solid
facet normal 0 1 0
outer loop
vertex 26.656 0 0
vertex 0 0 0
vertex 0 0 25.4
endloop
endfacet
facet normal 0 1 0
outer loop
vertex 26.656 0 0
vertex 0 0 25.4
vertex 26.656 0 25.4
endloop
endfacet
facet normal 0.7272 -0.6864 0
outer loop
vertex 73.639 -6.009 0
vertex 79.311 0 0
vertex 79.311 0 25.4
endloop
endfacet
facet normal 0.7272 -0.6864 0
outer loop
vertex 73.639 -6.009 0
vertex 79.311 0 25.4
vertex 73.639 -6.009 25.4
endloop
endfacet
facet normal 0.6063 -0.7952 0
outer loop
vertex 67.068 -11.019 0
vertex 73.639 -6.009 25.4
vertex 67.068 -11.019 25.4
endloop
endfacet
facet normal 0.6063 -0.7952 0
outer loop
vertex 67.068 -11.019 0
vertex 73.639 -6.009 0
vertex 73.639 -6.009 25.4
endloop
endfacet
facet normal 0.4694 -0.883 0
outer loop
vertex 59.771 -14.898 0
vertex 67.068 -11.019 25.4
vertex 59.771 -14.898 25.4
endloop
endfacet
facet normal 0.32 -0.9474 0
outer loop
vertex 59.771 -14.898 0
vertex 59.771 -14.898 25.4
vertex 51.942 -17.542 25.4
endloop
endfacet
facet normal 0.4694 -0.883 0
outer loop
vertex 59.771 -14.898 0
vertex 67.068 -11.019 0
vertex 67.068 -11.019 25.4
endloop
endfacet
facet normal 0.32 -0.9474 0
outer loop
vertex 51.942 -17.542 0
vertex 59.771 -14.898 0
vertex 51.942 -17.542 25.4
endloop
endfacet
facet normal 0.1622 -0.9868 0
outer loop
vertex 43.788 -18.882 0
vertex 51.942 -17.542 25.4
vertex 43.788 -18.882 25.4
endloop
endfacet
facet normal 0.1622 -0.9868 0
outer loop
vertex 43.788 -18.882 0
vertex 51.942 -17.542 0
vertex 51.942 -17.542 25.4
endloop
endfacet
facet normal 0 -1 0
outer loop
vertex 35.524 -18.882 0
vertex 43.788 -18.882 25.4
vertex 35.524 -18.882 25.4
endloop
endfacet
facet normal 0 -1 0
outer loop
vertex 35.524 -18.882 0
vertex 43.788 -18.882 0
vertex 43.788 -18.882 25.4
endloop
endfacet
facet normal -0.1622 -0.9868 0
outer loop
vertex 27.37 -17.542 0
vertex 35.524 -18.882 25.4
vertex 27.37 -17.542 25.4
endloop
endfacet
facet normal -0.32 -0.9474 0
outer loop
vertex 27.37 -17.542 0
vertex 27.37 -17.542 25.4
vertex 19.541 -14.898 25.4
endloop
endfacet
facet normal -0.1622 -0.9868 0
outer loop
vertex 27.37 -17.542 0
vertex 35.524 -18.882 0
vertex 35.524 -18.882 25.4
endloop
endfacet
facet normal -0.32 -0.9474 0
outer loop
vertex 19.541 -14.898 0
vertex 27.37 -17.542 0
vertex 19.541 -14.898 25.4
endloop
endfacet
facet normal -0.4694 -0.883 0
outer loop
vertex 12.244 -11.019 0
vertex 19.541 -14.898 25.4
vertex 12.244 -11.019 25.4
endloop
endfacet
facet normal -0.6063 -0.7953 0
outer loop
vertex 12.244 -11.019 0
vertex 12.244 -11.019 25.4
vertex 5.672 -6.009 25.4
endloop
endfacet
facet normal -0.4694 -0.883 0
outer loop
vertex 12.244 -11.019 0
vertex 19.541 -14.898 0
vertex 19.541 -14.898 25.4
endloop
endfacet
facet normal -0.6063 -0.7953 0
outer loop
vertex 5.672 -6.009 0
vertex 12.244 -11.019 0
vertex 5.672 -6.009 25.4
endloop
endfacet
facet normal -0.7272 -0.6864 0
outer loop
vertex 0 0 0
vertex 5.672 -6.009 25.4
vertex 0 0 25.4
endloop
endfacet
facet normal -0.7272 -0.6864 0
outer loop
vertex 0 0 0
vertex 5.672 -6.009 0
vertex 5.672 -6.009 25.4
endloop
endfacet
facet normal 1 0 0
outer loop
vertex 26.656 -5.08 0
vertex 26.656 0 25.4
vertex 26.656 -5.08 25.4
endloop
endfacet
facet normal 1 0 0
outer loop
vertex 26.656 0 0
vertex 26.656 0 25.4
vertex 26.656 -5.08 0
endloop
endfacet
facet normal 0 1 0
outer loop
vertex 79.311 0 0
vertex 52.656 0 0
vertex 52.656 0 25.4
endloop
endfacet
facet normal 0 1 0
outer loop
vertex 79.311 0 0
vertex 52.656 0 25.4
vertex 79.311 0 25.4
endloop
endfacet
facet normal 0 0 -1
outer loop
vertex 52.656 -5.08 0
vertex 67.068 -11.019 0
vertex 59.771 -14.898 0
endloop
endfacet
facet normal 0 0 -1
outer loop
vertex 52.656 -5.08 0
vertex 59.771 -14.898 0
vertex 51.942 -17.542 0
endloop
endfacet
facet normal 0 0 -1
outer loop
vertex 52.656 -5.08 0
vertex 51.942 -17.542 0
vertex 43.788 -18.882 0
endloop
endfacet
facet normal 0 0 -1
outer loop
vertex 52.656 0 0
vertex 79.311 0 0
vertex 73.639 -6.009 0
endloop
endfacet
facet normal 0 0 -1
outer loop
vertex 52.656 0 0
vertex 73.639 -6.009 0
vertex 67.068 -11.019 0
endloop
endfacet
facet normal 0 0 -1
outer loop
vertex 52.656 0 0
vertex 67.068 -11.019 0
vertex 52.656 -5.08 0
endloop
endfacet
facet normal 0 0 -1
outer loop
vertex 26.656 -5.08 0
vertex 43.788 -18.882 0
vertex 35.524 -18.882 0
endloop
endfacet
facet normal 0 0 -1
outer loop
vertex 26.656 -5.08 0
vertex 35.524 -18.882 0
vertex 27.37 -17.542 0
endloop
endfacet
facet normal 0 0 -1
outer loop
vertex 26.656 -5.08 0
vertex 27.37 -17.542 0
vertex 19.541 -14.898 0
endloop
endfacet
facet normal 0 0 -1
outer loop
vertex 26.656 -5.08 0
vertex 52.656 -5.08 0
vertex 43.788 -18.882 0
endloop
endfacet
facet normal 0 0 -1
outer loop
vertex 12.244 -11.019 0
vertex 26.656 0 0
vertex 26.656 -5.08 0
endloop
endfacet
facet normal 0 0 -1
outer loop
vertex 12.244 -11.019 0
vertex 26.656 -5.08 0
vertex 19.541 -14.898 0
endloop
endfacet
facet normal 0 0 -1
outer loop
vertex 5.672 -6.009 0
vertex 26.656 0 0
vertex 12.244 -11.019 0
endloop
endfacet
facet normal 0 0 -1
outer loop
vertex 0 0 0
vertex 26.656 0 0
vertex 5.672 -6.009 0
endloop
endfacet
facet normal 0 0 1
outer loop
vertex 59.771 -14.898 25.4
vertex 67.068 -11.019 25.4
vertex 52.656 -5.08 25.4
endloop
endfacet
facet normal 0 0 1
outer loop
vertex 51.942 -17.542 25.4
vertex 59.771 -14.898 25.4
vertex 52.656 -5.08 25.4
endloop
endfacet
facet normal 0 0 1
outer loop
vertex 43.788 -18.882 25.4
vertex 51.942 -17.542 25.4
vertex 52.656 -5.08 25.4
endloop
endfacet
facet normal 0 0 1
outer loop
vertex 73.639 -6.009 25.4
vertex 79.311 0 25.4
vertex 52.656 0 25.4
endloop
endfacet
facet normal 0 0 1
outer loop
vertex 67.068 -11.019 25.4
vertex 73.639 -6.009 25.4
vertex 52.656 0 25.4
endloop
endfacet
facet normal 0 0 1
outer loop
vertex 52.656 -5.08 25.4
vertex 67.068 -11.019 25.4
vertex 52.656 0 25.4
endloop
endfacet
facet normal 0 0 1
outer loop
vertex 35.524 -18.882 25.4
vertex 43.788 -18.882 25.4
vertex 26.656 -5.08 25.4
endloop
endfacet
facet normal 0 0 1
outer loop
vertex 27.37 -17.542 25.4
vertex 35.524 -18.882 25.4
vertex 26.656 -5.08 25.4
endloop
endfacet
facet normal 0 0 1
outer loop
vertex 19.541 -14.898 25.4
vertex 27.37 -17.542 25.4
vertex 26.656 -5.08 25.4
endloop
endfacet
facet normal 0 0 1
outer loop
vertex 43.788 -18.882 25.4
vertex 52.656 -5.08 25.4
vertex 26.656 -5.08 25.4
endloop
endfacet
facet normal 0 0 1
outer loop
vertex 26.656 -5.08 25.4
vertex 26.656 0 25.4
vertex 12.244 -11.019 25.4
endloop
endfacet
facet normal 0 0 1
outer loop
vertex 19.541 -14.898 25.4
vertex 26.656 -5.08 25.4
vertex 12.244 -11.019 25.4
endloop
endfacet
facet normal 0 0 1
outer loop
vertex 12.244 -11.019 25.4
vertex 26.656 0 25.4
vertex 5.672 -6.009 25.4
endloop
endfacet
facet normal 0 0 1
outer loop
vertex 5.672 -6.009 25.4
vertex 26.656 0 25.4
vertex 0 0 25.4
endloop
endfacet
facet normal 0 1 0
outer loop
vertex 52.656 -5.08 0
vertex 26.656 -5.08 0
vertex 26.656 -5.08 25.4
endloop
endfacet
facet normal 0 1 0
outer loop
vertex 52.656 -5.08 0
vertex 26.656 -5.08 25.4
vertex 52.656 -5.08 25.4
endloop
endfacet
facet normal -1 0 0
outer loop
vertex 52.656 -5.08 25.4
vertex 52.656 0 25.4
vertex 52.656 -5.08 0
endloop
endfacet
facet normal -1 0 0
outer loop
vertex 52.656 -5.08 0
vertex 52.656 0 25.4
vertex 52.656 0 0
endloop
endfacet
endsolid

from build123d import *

# Parameters (mm, degrees)
BOSS_EXTRUDE1_DEPTH = 25.4
SKETCH4_W           = 26
SKETCH4_H           = 25.4
CUT_EXTRUDE3_DEPTH  = 5.08


with BuildPart() as part:
    # Sketch1 → Boss-Extrude1 (new body)
    with BuildSketch(Plane.XY):
        with BuildLine():
            Line((0, 0), (79.31147458, 0))
            ThreePointArc((79.31147458, 0), (39.65573729, -19.05), (0, 0))
        make_face()
    extrude(amount=BOSS_EXTRUDE1_DEPTH)

    # Sketch4 → Cut-Extrude3 (cut)
    with BuildSketch(Plane(origin=(0, 0, 0), x_dir=(1, 0, 0), z_dir=(0, 1, 0))):
        with Locations((39.65573729, -12.7)):
            Rectangle(SKETCH4_W, SKETCH4_H)
    extrude(amount=-CUT_EXTRUDE3_DEPTH, mode=Mode.SUBTRACT)


solid = part.part
